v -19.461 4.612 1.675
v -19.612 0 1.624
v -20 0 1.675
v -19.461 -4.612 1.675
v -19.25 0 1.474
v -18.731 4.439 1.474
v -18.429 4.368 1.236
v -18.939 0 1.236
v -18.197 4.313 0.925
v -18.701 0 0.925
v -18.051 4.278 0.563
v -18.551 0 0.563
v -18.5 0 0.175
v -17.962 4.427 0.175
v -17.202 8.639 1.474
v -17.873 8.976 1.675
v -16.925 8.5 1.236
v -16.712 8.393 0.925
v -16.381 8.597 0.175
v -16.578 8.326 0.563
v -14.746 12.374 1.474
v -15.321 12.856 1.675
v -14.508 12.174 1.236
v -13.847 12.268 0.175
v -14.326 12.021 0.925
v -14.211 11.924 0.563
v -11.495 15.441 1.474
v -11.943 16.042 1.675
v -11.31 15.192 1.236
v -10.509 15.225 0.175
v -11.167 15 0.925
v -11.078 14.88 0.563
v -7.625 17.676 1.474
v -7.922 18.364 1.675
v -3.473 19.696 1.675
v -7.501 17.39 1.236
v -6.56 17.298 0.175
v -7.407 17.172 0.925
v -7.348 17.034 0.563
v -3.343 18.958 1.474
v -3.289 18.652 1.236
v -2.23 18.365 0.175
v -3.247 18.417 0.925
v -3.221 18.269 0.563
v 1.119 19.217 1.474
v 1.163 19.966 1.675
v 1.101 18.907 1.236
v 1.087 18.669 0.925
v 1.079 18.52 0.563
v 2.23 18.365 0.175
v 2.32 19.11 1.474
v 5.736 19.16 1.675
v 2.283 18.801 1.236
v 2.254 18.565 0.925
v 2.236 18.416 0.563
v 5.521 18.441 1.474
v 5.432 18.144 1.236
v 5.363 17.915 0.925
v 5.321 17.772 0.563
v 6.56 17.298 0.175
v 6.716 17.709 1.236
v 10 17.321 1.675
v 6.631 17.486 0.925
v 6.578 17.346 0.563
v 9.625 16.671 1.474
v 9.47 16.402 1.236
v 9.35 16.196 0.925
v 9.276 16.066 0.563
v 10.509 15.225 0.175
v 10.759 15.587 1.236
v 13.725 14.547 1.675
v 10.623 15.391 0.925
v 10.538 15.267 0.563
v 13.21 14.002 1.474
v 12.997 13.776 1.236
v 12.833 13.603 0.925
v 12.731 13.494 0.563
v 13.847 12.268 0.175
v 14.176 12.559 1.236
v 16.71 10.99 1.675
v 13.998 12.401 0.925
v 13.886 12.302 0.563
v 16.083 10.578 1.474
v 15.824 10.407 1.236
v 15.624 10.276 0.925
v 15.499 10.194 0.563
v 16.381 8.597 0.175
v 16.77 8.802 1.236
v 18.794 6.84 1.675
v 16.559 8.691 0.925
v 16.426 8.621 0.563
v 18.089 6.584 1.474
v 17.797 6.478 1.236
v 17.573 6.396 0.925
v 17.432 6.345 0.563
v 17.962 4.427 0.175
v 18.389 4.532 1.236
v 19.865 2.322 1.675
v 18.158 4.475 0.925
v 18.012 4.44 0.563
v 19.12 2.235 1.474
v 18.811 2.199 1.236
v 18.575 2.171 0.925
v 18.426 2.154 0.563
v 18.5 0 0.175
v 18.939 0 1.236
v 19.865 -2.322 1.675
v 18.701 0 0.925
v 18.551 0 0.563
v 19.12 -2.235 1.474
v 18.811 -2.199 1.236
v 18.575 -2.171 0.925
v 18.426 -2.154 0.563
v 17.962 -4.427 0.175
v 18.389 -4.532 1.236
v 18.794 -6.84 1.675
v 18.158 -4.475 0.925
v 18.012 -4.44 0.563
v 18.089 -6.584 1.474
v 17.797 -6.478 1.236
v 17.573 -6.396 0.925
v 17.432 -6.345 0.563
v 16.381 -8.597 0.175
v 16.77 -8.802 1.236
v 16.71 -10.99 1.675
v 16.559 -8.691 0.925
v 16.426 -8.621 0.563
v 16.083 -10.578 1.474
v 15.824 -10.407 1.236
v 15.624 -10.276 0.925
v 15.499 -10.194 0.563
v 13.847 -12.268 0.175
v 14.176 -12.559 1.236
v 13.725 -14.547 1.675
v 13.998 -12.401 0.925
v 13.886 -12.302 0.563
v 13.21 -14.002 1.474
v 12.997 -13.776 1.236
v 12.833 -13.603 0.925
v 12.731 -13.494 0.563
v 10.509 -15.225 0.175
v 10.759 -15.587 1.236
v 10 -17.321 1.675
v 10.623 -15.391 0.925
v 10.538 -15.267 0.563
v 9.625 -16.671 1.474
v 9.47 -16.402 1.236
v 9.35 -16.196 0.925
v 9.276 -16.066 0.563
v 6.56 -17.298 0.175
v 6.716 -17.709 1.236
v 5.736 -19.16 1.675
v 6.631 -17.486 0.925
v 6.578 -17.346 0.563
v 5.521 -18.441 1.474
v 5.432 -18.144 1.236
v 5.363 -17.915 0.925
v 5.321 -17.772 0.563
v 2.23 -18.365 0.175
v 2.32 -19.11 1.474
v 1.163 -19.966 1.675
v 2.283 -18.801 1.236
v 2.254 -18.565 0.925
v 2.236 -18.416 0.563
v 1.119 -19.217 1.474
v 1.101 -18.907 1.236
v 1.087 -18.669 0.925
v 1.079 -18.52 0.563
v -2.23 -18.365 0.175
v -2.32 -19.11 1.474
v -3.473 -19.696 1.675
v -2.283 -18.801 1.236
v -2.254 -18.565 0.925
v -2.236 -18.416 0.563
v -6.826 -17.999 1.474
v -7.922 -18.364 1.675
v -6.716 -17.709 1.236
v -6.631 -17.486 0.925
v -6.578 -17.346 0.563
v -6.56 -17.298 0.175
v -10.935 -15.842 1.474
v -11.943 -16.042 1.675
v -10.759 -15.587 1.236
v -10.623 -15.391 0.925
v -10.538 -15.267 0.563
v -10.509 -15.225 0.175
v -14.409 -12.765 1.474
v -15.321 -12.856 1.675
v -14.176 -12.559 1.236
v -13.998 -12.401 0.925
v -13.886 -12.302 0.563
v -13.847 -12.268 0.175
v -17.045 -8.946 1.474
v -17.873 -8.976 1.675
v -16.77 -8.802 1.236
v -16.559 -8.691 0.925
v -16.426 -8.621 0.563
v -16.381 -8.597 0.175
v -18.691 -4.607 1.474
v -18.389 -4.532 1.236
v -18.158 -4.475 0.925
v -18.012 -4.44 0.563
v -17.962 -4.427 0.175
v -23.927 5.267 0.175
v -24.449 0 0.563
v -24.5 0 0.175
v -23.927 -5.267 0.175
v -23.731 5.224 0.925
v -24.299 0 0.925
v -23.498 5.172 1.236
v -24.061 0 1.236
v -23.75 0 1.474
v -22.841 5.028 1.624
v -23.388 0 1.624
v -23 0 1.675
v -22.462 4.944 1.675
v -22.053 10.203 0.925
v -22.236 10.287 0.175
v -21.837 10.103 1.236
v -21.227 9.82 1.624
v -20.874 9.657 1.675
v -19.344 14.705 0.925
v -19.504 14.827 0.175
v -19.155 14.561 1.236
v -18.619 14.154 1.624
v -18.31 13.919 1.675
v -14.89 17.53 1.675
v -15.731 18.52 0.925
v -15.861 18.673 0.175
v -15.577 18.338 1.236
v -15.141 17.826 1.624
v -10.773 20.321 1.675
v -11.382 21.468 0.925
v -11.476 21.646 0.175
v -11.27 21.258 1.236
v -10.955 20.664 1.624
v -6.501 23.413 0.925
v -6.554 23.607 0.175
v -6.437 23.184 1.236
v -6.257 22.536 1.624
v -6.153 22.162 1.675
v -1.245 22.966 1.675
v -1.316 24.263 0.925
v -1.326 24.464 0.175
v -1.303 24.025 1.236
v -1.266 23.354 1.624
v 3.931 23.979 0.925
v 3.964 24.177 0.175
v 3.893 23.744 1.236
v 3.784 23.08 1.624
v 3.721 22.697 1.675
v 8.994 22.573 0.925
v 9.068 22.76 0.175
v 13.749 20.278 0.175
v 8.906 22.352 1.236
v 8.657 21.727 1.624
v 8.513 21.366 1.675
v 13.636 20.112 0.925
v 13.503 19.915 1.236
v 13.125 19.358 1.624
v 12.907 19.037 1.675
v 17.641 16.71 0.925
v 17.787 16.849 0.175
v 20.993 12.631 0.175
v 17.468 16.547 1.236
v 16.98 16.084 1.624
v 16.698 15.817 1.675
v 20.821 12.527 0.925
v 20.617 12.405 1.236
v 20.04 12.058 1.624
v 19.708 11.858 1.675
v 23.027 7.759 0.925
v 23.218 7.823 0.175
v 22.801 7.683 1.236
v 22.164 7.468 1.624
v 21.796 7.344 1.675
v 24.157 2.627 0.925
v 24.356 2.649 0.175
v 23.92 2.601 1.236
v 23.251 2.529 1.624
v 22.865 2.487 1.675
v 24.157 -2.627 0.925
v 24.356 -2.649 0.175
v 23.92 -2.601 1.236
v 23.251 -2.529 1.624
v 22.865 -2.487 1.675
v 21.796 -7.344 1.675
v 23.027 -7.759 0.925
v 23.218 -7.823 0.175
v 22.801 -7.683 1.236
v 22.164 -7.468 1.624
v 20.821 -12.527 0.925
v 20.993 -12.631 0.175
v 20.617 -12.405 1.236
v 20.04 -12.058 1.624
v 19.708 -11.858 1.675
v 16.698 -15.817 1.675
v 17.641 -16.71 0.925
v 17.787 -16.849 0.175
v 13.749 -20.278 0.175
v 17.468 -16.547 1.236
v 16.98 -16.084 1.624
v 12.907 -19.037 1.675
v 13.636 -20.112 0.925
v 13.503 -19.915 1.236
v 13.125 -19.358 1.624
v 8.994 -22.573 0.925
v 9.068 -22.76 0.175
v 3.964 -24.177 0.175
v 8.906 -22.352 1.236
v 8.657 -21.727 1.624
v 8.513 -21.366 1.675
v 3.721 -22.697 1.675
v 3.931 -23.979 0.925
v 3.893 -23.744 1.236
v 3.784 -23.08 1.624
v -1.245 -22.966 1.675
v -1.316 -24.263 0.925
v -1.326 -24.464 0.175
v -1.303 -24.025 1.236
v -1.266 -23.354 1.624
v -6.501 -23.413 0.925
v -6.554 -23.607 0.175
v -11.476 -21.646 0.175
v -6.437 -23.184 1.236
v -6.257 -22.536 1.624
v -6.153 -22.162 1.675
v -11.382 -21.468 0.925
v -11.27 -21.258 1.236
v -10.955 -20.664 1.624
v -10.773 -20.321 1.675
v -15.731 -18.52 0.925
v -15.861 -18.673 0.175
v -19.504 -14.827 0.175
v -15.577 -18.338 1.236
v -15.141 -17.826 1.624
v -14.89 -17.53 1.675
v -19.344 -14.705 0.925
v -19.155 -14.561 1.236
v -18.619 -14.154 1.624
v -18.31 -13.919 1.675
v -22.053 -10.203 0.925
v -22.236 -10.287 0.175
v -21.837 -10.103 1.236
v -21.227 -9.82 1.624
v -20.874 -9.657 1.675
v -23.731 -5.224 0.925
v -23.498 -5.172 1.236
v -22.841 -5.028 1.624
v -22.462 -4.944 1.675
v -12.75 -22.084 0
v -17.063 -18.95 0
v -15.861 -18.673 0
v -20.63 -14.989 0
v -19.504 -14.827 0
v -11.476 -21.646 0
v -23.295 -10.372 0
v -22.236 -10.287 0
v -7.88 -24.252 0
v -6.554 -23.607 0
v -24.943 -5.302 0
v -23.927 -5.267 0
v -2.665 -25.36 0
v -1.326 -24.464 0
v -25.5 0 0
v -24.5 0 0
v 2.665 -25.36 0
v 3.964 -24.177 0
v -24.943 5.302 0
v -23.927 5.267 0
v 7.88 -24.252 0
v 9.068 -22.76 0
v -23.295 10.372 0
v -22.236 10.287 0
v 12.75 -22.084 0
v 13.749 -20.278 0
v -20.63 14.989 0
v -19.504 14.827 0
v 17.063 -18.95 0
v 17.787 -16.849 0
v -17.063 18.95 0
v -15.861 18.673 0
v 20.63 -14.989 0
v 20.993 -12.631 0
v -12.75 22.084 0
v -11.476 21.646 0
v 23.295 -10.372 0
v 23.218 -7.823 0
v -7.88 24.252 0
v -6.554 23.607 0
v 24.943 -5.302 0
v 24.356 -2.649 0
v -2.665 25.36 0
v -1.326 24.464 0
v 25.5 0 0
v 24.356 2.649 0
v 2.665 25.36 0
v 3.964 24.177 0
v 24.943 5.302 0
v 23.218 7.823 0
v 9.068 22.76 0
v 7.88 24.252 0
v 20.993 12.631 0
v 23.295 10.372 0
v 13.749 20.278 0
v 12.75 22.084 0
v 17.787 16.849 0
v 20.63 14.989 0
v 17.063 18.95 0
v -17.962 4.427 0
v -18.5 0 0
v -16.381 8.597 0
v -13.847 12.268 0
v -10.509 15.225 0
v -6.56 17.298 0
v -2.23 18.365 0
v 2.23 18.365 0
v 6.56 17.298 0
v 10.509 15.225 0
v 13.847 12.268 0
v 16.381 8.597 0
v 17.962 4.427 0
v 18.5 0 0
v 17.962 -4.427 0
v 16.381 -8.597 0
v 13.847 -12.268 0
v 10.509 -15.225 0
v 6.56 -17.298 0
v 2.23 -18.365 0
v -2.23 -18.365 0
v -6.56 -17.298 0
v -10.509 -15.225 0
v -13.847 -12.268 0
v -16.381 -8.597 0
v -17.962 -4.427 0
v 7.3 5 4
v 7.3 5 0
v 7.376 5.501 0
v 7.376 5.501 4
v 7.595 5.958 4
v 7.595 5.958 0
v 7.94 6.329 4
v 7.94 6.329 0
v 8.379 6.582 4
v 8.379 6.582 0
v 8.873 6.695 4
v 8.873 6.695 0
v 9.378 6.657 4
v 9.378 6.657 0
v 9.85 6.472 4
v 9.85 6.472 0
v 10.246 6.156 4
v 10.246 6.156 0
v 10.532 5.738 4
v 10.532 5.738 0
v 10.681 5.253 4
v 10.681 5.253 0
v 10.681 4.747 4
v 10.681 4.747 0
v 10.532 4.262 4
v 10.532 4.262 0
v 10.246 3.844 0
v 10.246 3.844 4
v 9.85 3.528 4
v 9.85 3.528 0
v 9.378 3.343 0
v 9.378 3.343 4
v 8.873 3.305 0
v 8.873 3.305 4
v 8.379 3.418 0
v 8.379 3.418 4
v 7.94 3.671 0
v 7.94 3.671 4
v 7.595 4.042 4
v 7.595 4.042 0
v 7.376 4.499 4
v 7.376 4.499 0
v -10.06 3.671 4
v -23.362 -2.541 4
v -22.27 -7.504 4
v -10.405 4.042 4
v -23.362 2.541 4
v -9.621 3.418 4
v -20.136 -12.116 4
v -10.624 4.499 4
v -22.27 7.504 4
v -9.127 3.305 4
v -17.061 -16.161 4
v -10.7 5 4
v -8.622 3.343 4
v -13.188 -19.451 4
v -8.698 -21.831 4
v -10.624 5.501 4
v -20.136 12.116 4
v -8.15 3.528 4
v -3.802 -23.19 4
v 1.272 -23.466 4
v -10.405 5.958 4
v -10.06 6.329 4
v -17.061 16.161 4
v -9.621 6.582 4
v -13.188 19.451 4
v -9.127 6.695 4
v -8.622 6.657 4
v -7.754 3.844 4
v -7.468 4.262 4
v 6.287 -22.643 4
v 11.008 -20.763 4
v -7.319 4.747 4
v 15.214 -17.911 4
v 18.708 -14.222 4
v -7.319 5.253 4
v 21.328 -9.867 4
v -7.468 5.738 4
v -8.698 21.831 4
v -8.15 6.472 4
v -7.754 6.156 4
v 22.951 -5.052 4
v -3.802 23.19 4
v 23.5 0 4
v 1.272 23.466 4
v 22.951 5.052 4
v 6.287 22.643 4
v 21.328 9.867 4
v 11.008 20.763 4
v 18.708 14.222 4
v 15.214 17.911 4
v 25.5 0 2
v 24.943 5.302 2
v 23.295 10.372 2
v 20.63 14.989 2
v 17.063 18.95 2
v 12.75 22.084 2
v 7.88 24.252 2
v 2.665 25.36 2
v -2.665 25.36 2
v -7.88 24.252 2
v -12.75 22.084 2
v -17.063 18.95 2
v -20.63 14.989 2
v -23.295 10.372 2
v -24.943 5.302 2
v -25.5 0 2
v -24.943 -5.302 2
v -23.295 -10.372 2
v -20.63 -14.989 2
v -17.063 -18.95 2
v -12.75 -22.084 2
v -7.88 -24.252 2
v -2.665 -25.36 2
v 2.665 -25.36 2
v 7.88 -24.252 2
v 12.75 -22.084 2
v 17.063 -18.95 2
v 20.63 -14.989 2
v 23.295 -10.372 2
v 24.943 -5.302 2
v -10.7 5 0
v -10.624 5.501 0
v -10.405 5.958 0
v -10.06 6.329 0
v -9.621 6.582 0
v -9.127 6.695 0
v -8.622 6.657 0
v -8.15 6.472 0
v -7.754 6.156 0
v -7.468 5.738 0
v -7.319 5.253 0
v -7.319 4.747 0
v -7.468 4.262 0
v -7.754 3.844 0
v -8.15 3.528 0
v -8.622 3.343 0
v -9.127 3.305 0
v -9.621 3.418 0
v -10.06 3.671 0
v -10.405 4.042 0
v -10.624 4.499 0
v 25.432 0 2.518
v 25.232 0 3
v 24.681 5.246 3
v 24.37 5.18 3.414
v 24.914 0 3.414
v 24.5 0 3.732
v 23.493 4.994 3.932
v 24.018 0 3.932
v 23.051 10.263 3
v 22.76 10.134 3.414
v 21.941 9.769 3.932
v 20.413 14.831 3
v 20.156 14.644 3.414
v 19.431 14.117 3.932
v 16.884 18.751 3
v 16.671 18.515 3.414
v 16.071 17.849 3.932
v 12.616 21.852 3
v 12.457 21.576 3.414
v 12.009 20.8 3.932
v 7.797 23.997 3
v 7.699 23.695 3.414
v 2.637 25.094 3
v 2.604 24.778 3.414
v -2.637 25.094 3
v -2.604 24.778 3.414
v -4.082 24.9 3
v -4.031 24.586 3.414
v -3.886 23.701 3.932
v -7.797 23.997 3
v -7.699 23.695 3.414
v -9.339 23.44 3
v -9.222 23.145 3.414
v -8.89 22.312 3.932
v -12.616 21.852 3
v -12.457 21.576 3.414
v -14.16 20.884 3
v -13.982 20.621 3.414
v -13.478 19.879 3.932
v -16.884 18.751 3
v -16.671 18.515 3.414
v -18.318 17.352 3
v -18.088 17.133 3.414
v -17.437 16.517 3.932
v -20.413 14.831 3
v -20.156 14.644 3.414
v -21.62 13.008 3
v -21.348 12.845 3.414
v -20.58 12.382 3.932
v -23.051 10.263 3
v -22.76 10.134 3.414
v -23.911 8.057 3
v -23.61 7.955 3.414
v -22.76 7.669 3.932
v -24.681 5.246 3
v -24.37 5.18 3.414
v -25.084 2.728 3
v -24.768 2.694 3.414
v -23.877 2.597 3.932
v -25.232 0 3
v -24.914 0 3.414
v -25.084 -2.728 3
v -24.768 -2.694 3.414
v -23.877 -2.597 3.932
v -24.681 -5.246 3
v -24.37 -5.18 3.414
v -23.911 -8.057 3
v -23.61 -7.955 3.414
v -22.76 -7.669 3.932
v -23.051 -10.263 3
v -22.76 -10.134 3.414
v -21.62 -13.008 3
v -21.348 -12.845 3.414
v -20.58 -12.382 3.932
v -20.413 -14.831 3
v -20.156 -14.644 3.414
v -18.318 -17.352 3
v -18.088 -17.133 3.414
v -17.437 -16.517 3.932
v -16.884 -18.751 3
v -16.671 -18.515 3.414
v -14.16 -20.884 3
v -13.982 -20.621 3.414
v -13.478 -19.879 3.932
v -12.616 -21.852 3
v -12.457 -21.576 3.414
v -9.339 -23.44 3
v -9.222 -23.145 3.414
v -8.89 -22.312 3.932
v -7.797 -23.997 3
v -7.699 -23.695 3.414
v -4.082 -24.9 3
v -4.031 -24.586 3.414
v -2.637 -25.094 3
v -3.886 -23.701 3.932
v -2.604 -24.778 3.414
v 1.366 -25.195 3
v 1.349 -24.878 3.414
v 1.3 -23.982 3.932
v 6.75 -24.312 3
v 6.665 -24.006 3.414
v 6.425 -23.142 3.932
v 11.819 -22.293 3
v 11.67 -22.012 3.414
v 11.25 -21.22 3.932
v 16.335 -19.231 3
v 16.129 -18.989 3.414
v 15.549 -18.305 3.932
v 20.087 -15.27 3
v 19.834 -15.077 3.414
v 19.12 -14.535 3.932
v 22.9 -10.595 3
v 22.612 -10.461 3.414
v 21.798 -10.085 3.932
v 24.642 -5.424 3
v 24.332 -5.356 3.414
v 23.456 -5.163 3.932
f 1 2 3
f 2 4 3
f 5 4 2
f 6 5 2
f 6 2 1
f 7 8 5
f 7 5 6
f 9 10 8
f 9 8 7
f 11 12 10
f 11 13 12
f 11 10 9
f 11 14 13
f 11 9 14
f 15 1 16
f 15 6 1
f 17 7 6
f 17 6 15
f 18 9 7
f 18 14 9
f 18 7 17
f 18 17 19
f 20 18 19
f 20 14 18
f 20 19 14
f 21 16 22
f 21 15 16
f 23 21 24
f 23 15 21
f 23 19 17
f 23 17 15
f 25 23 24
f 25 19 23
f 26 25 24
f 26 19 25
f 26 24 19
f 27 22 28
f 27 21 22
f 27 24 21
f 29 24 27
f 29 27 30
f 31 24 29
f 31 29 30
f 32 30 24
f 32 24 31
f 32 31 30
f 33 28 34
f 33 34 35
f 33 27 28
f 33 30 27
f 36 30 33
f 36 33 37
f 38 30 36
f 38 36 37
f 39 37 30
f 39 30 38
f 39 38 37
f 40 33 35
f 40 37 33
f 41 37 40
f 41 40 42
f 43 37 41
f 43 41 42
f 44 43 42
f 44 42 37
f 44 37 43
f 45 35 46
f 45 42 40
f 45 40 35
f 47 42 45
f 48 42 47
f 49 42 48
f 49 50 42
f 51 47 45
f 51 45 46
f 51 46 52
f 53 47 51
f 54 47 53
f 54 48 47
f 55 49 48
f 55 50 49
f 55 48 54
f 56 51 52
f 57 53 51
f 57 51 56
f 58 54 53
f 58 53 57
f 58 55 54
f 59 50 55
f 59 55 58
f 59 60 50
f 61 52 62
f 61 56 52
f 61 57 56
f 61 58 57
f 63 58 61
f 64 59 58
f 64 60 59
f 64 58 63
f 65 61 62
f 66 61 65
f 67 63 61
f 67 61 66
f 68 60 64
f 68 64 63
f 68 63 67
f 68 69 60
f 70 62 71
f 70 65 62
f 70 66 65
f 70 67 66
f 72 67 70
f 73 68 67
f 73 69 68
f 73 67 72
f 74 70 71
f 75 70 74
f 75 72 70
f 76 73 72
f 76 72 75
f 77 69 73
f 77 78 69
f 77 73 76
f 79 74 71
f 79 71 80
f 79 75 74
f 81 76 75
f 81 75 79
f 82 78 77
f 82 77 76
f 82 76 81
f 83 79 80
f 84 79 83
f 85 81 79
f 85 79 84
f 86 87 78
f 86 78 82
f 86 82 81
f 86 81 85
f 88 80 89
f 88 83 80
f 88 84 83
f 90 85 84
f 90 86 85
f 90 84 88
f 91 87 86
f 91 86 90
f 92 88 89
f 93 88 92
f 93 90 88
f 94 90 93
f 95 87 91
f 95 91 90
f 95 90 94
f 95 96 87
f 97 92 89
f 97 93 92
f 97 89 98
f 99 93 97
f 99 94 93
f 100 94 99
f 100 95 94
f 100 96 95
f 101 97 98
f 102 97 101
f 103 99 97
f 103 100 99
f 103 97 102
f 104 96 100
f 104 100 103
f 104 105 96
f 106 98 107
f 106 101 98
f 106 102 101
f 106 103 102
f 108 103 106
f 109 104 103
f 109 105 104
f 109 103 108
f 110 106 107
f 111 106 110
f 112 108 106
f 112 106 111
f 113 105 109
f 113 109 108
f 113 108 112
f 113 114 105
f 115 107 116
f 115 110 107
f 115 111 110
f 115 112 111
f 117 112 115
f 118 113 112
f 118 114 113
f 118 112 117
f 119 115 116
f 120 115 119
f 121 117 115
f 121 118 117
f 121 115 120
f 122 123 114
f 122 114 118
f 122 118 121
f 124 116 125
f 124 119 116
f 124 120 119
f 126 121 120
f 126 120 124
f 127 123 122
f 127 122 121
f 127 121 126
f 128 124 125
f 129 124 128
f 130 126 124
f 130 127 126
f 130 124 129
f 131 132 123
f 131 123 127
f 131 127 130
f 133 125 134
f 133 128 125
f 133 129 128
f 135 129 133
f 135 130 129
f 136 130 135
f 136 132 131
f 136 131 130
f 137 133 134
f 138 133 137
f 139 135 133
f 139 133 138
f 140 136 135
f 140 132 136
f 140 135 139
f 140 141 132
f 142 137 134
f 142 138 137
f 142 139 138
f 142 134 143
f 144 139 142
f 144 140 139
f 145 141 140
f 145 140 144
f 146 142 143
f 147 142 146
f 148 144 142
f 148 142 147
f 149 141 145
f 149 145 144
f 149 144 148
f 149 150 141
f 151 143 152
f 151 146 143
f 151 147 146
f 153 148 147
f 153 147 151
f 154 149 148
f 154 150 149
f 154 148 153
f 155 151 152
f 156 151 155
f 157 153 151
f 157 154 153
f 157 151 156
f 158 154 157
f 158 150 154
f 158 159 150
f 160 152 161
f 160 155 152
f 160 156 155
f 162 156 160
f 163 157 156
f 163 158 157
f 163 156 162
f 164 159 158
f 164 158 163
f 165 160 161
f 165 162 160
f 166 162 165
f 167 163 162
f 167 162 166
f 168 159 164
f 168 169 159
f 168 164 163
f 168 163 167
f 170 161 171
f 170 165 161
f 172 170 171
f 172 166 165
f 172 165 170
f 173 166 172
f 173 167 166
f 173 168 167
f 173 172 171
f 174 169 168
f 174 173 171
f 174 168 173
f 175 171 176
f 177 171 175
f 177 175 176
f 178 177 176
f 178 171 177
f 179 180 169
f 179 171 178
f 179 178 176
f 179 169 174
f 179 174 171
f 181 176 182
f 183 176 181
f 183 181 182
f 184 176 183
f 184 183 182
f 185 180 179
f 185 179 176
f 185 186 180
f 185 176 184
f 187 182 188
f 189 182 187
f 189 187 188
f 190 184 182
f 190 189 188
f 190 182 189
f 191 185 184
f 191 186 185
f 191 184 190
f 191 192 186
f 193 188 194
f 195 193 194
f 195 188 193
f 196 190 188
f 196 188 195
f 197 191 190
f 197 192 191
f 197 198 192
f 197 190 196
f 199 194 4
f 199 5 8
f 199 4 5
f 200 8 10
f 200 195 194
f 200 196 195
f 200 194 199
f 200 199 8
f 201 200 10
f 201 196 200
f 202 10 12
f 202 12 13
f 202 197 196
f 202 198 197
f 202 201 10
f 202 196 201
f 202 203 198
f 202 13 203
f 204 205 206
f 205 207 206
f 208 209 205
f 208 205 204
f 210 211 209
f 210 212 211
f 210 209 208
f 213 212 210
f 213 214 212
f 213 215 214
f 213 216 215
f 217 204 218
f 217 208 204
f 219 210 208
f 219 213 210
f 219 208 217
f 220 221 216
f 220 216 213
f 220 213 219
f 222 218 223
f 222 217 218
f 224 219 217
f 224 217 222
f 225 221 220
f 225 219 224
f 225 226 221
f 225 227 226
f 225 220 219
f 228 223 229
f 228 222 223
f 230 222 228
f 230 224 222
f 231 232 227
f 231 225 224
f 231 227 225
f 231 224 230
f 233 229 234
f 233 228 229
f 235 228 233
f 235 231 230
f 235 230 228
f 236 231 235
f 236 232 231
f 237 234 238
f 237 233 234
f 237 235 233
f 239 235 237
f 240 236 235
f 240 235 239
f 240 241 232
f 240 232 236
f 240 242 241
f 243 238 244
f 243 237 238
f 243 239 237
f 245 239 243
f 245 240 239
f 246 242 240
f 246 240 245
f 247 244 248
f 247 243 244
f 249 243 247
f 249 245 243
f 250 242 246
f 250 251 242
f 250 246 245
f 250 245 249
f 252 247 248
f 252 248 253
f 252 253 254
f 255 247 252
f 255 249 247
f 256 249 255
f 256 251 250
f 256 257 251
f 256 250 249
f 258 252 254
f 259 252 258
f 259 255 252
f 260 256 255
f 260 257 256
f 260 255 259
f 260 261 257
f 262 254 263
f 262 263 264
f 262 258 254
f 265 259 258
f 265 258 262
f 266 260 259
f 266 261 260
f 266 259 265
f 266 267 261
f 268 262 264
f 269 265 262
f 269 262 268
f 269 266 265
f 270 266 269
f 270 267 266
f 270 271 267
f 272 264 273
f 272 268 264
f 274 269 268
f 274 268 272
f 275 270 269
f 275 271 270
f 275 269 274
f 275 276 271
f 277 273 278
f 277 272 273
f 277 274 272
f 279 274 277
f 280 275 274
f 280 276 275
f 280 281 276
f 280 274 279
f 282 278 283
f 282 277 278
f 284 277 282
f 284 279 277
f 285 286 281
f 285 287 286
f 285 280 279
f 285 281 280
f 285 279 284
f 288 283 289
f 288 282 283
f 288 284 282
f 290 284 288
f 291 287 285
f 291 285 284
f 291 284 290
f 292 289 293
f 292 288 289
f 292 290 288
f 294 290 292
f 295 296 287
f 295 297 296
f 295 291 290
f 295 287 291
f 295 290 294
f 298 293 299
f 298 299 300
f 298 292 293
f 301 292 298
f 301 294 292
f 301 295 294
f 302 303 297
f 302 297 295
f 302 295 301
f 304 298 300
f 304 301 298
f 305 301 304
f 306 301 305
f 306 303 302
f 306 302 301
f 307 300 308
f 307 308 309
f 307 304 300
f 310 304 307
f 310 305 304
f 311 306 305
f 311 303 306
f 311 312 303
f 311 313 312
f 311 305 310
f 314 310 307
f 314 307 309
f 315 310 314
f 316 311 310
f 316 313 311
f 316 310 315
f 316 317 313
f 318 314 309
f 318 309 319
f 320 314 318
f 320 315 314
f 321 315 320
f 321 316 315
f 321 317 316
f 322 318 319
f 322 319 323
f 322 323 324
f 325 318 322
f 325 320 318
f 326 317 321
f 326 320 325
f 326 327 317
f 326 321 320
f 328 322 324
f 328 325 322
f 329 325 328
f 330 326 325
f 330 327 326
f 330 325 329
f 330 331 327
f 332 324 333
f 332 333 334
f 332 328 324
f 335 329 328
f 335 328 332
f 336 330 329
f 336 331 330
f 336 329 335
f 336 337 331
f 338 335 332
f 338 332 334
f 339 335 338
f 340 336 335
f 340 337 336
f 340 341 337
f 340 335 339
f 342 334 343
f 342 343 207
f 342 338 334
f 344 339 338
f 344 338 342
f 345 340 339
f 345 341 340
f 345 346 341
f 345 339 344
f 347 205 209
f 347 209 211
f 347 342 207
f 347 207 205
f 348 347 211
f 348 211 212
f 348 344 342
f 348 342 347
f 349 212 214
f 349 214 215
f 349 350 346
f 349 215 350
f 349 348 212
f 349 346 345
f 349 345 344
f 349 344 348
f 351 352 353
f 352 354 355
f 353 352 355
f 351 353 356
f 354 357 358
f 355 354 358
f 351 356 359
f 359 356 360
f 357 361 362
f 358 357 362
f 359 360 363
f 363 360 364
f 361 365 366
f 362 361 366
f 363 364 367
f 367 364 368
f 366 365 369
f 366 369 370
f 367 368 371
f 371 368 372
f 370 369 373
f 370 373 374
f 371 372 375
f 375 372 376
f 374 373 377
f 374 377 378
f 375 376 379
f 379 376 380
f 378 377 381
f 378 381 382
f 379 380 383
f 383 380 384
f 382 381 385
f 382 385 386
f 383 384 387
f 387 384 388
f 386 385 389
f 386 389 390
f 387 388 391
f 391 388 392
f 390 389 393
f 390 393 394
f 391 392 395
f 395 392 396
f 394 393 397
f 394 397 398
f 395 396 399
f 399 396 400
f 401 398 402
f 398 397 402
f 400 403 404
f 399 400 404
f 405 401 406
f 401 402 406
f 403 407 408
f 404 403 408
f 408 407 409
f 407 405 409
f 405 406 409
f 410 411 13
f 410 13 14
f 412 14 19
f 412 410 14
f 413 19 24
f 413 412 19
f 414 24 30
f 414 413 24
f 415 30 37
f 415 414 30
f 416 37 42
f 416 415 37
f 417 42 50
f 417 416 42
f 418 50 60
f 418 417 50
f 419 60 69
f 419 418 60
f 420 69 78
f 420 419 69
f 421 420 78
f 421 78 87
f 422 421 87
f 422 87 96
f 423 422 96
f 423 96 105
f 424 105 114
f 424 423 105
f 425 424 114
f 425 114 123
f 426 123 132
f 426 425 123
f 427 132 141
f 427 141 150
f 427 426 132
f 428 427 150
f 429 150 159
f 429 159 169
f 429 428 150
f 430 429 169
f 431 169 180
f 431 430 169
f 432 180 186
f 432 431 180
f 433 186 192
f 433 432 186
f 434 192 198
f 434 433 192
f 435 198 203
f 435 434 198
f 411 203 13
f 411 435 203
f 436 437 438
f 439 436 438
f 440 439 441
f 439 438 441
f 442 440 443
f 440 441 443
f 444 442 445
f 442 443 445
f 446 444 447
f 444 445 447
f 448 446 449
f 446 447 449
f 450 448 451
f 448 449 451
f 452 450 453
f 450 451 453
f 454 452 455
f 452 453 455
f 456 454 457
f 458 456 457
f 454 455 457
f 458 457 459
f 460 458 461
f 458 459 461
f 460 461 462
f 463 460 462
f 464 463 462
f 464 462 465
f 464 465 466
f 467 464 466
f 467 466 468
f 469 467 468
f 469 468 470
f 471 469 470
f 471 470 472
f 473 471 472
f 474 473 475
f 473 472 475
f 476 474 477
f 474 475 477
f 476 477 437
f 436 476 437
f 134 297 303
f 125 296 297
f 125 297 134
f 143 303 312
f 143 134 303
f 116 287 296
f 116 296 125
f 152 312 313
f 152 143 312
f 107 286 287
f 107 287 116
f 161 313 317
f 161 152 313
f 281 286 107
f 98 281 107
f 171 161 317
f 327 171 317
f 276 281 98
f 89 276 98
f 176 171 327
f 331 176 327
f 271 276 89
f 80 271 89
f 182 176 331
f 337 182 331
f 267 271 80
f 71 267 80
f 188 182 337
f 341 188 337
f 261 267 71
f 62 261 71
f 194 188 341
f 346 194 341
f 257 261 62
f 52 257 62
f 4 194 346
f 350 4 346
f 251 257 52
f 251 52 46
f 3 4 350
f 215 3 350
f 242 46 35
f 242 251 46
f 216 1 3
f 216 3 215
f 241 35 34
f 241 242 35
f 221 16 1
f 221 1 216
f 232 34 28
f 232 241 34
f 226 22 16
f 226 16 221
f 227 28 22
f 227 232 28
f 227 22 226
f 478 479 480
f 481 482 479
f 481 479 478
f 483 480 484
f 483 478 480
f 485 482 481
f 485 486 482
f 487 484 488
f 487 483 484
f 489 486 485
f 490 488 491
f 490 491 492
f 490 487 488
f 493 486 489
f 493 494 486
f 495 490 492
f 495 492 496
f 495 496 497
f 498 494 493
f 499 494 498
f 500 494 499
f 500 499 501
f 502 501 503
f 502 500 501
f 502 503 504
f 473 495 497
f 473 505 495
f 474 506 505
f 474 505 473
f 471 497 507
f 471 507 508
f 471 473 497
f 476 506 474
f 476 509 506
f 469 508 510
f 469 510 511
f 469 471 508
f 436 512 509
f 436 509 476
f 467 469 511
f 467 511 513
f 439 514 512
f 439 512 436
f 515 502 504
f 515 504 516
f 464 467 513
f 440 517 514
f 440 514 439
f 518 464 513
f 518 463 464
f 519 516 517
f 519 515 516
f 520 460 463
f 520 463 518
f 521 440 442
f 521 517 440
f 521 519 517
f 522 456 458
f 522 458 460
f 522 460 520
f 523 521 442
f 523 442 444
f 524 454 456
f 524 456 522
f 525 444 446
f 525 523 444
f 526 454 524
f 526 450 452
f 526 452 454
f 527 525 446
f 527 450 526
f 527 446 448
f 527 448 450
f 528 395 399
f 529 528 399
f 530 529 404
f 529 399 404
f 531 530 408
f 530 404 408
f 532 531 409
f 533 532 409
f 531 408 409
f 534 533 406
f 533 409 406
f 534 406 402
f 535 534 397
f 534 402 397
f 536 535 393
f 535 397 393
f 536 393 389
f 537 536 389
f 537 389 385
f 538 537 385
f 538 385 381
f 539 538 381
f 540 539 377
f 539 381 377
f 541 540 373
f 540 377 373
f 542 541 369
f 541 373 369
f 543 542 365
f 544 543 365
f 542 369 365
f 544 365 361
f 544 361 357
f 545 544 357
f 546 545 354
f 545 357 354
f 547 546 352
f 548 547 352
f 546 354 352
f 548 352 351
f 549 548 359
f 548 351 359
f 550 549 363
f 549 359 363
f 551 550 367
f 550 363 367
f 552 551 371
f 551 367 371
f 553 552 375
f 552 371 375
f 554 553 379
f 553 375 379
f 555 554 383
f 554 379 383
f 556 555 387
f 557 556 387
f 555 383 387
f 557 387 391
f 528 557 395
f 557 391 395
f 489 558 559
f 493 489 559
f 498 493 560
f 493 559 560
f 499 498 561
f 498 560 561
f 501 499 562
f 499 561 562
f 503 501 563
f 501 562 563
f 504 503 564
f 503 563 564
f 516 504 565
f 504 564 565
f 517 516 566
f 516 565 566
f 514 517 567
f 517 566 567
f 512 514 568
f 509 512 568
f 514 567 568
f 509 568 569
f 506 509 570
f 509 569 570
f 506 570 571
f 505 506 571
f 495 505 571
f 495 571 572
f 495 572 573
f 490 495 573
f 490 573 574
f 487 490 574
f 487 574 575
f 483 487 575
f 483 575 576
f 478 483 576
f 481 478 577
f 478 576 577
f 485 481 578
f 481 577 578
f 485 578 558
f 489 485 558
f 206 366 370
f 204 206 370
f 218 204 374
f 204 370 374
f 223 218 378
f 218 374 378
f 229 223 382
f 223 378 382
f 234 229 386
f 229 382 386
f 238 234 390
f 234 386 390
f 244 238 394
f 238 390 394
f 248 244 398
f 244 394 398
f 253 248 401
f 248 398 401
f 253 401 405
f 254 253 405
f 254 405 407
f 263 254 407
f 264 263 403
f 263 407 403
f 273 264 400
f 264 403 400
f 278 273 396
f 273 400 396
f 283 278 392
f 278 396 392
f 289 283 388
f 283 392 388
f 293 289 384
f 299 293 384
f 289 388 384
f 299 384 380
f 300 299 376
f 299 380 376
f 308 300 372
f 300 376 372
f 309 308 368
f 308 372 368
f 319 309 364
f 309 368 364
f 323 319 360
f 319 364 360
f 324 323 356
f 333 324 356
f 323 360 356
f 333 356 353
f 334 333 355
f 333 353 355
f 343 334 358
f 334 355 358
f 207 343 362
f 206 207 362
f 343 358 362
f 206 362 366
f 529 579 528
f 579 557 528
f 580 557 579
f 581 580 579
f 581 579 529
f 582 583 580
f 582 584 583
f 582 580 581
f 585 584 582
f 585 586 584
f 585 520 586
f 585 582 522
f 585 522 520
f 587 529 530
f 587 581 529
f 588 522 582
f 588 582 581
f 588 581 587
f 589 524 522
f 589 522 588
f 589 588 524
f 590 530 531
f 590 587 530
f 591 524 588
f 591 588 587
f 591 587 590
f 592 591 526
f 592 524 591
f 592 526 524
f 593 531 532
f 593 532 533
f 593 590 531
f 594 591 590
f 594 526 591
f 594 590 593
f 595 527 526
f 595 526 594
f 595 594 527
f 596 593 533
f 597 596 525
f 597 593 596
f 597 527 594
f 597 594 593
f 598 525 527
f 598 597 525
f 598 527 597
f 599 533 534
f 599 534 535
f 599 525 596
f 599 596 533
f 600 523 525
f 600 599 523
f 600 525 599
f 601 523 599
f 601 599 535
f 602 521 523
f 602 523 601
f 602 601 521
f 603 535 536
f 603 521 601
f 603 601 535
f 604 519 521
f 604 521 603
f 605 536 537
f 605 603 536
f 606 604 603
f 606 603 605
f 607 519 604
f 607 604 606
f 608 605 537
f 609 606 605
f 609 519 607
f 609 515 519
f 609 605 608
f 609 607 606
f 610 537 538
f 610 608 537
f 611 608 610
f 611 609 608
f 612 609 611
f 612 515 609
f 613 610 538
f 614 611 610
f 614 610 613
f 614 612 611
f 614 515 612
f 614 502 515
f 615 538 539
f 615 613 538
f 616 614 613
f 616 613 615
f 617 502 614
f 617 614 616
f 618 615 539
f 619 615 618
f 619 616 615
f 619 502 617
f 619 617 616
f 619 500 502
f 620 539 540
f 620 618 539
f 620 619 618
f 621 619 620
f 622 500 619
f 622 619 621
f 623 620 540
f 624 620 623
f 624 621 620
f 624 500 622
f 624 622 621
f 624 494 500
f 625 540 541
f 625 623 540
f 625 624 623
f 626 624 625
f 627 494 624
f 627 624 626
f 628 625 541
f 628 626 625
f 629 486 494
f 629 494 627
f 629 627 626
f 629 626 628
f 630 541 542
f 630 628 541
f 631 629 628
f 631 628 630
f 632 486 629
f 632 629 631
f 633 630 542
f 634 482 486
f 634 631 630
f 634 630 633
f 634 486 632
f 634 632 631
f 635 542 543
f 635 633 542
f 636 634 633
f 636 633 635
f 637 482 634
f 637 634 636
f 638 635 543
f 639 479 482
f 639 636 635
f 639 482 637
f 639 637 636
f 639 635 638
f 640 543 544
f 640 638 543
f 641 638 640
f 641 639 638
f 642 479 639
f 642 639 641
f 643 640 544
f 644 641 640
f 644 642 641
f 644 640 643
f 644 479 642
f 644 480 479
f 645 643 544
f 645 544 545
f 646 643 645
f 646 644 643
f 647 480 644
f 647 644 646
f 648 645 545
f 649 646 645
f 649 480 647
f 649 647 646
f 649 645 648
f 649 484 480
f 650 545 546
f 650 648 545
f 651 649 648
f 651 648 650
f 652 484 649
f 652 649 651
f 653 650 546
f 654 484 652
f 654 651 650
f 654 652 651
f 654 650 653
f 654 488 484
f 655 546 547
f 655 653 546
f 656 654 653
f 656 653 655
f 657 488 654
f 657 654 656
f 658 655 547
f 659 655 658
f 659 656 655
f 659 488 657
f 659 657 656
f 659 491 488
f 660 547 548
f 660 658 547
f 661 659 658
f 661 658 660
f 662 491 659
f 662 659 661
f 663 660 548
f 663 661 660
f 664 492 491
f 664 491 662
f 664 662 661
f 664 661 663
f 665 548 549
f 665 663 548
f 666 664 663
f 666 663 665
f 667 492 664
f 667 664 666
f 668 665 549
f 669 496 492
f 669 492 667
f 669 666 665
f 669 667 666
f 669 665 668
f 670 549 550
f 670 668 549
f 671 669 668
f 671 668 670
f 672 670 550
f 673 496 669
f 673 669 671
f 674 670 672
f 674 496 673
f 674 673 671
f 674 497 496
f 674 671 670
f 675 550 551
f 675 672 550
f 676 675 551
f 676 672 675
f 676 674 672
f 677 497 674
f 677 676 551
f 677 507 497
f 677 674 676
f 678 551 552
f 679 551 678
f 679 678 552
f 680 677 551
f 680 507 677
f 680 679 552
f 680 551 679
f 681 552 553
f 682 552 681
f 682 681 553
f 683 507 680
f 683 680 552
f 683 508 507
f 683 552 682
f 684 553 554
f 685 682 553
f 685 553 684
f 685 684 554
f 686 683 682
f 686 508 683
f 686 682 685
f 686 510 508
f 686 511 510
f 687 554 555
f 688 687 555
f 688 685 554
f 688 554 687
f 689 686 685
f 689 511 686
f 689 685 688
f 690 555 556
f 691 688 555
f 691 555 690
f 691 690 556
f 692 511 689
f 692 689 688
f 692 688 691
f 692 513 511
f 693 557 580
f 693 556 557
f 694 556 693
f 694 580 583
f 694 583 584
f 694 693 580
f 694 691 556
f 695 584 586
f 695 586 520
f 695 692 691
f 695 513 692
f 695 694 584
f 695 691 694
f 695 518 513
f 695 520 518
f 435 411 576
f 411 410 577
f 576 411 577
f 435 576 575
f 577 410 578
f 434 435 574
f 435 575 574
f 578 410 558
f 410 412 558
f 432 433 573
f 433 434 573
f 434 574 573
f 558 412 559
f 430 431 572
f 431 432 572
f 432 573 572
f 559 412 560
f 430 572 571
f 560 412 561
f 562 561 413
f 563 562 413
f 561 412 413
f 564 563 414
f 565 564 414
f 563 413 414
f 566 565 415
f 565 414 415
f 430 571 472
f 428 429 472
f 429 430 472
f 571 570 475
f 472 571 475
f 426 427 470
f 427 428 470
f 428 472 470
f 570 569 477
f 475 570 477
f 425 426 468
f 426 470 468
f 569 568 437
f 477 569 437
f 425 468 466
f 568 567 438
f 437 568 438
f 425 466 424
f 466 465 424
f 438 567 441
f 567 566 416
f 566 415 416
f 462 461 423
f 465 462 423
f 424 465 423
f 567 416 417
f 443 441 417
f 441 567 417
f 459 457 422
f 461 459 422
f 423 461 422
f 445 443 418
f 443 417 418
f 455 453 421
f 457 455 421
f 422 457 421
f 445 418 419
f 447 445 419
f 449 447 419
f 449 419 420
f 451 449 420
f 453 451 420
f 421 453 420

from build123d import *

# Parameters (mm, degrees)
SKETCH1_R           = 25.5
BOSS_EXTRUDE1_DEPTH = 4
SKETCH3_R           = 24.5
SKETCH3_R_2         = 18.5
CUT_EXTRUDE1_DEPTH  = 1.675
FILLET1_R           = 1.5
FILLET2_R           = 2
SKETCH4_R           = 1.7
CUT_EXTRUDE2_DEPTH  = 4


with BuildPart() as part:
    # Sketch1 → Boss-Extrude1 (new body)
    with BuildSketch(Plane.XY):
        Circle(SKETCH1_R)
    extrude(amount=BOSS_EXTRUDE1_DEPTH)

    # Sketch3 → Cut-Extrude1 (cut)
    with BuildSketch(Plane(origin=(0, 0, 0), x_dir=(-1, 0, 0), z_dir=(0, 0, -1))):
        Circle(SKETCH3_R)
        Circle(SKETCH3_R_2, mode=Mode.SUBTRACT)
    extrude(amount=-CUT_EXTRUDE1_DEPTH, mode=Mode.SUBTRACT)

    # Fillet1
    fillet1_edges = [part.edges().sort_by_distance(p)[0] for p in [
        (24.5, 0, 1.675),
        (18.5, 0, 1.675),
    ]]
    fillet(fillet1_edges, radius=FILLET1_R)

    # Fillet2
    fillet2_edges = [part.edges().sort_by_distance(p)[0] for p in [
        (-25.5, 0, 4),
    ]]
    fillet(fillet2_edges, radius=FILLET2_R)

    # Sketch4 → Cut-Extrude2 (cut)
    with BuildSketch(Plane(origin=(0, 0, 0), x_dir=(-1, 0, 0), z_dir=(0, 0, -1))):
        with Locations((-9, 5)):
            Circle(SKETCH4_R)
        with Locations((9, 5)):
            Circle(SKETCH4_R)
    extrude(amount=-CUT_EXTRUDE2_DEPTH, mode=Mode.SUBTRACT)


solid = part.part
